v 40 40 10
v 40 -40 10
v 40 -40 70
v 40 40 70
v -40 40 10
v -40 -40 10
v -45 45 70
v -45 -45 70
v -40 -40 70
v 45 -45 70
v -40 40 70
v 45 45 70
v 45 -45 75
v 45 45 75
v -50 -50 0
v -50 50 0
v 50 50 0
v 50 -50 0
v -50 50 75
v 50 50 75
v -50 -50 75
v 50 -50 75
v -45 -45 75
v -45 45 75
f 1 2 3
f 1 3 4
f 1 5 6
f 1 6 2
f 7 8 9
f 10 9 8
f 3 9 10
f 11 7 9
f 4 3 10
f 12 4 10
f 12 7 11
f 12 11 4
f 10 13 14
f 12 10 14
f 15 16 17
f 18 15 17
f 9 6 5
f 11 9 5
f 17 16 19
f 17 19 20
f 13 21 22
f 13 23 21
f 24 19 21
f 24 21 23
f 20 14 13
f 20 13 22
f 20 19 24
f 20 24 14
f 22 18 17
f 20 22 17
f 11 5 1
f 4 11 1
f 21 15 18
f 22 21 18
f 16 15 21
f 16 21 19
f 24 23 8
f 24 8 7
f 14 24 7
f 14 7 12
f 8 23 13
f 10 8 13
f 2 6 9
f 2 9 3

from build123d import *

# Parameters (mm, degrees)
SKETCH2_W           = 100
SKETCH2_H           = 100
BOSS_EXTRUDE1_DEPTH = 75
SHELL1_T            = -10
SKETCH3_W           = 90
SKETCH3_H           = 90
CUT_EXTRUDE1_DEPTH  = 5


with BuildPart() as part:
    # Sketch2 → Boss-Extrude1 (new body)
    with BuildSketch(Plane.XY):
        Rectangle(SKETCH2_W, SKETCH2_H)
    extrude(amount=BOSS_EXTRUDE1_DEPTH)

    # Shell1
    shell1_openings = [part.faces().sort_by_distance(p)[0] for p in [
        (0, 0, 75),
    ]]
    offset(amount=SHELL1_T, openings=shell1_openings, kind=Kind.INTERSECTION)

    # Sketch3 → Cut-Extrude1 (cut)
    with BuildSketch(Plane.XY.offset(75)):
        Rectangle(SKETCH3_W, SKETCH3_H)
    extrude(amount=-CUT_EXTRUDE1_DEPTH, mode=Mode.SUBTRACT)


solid = part.part
